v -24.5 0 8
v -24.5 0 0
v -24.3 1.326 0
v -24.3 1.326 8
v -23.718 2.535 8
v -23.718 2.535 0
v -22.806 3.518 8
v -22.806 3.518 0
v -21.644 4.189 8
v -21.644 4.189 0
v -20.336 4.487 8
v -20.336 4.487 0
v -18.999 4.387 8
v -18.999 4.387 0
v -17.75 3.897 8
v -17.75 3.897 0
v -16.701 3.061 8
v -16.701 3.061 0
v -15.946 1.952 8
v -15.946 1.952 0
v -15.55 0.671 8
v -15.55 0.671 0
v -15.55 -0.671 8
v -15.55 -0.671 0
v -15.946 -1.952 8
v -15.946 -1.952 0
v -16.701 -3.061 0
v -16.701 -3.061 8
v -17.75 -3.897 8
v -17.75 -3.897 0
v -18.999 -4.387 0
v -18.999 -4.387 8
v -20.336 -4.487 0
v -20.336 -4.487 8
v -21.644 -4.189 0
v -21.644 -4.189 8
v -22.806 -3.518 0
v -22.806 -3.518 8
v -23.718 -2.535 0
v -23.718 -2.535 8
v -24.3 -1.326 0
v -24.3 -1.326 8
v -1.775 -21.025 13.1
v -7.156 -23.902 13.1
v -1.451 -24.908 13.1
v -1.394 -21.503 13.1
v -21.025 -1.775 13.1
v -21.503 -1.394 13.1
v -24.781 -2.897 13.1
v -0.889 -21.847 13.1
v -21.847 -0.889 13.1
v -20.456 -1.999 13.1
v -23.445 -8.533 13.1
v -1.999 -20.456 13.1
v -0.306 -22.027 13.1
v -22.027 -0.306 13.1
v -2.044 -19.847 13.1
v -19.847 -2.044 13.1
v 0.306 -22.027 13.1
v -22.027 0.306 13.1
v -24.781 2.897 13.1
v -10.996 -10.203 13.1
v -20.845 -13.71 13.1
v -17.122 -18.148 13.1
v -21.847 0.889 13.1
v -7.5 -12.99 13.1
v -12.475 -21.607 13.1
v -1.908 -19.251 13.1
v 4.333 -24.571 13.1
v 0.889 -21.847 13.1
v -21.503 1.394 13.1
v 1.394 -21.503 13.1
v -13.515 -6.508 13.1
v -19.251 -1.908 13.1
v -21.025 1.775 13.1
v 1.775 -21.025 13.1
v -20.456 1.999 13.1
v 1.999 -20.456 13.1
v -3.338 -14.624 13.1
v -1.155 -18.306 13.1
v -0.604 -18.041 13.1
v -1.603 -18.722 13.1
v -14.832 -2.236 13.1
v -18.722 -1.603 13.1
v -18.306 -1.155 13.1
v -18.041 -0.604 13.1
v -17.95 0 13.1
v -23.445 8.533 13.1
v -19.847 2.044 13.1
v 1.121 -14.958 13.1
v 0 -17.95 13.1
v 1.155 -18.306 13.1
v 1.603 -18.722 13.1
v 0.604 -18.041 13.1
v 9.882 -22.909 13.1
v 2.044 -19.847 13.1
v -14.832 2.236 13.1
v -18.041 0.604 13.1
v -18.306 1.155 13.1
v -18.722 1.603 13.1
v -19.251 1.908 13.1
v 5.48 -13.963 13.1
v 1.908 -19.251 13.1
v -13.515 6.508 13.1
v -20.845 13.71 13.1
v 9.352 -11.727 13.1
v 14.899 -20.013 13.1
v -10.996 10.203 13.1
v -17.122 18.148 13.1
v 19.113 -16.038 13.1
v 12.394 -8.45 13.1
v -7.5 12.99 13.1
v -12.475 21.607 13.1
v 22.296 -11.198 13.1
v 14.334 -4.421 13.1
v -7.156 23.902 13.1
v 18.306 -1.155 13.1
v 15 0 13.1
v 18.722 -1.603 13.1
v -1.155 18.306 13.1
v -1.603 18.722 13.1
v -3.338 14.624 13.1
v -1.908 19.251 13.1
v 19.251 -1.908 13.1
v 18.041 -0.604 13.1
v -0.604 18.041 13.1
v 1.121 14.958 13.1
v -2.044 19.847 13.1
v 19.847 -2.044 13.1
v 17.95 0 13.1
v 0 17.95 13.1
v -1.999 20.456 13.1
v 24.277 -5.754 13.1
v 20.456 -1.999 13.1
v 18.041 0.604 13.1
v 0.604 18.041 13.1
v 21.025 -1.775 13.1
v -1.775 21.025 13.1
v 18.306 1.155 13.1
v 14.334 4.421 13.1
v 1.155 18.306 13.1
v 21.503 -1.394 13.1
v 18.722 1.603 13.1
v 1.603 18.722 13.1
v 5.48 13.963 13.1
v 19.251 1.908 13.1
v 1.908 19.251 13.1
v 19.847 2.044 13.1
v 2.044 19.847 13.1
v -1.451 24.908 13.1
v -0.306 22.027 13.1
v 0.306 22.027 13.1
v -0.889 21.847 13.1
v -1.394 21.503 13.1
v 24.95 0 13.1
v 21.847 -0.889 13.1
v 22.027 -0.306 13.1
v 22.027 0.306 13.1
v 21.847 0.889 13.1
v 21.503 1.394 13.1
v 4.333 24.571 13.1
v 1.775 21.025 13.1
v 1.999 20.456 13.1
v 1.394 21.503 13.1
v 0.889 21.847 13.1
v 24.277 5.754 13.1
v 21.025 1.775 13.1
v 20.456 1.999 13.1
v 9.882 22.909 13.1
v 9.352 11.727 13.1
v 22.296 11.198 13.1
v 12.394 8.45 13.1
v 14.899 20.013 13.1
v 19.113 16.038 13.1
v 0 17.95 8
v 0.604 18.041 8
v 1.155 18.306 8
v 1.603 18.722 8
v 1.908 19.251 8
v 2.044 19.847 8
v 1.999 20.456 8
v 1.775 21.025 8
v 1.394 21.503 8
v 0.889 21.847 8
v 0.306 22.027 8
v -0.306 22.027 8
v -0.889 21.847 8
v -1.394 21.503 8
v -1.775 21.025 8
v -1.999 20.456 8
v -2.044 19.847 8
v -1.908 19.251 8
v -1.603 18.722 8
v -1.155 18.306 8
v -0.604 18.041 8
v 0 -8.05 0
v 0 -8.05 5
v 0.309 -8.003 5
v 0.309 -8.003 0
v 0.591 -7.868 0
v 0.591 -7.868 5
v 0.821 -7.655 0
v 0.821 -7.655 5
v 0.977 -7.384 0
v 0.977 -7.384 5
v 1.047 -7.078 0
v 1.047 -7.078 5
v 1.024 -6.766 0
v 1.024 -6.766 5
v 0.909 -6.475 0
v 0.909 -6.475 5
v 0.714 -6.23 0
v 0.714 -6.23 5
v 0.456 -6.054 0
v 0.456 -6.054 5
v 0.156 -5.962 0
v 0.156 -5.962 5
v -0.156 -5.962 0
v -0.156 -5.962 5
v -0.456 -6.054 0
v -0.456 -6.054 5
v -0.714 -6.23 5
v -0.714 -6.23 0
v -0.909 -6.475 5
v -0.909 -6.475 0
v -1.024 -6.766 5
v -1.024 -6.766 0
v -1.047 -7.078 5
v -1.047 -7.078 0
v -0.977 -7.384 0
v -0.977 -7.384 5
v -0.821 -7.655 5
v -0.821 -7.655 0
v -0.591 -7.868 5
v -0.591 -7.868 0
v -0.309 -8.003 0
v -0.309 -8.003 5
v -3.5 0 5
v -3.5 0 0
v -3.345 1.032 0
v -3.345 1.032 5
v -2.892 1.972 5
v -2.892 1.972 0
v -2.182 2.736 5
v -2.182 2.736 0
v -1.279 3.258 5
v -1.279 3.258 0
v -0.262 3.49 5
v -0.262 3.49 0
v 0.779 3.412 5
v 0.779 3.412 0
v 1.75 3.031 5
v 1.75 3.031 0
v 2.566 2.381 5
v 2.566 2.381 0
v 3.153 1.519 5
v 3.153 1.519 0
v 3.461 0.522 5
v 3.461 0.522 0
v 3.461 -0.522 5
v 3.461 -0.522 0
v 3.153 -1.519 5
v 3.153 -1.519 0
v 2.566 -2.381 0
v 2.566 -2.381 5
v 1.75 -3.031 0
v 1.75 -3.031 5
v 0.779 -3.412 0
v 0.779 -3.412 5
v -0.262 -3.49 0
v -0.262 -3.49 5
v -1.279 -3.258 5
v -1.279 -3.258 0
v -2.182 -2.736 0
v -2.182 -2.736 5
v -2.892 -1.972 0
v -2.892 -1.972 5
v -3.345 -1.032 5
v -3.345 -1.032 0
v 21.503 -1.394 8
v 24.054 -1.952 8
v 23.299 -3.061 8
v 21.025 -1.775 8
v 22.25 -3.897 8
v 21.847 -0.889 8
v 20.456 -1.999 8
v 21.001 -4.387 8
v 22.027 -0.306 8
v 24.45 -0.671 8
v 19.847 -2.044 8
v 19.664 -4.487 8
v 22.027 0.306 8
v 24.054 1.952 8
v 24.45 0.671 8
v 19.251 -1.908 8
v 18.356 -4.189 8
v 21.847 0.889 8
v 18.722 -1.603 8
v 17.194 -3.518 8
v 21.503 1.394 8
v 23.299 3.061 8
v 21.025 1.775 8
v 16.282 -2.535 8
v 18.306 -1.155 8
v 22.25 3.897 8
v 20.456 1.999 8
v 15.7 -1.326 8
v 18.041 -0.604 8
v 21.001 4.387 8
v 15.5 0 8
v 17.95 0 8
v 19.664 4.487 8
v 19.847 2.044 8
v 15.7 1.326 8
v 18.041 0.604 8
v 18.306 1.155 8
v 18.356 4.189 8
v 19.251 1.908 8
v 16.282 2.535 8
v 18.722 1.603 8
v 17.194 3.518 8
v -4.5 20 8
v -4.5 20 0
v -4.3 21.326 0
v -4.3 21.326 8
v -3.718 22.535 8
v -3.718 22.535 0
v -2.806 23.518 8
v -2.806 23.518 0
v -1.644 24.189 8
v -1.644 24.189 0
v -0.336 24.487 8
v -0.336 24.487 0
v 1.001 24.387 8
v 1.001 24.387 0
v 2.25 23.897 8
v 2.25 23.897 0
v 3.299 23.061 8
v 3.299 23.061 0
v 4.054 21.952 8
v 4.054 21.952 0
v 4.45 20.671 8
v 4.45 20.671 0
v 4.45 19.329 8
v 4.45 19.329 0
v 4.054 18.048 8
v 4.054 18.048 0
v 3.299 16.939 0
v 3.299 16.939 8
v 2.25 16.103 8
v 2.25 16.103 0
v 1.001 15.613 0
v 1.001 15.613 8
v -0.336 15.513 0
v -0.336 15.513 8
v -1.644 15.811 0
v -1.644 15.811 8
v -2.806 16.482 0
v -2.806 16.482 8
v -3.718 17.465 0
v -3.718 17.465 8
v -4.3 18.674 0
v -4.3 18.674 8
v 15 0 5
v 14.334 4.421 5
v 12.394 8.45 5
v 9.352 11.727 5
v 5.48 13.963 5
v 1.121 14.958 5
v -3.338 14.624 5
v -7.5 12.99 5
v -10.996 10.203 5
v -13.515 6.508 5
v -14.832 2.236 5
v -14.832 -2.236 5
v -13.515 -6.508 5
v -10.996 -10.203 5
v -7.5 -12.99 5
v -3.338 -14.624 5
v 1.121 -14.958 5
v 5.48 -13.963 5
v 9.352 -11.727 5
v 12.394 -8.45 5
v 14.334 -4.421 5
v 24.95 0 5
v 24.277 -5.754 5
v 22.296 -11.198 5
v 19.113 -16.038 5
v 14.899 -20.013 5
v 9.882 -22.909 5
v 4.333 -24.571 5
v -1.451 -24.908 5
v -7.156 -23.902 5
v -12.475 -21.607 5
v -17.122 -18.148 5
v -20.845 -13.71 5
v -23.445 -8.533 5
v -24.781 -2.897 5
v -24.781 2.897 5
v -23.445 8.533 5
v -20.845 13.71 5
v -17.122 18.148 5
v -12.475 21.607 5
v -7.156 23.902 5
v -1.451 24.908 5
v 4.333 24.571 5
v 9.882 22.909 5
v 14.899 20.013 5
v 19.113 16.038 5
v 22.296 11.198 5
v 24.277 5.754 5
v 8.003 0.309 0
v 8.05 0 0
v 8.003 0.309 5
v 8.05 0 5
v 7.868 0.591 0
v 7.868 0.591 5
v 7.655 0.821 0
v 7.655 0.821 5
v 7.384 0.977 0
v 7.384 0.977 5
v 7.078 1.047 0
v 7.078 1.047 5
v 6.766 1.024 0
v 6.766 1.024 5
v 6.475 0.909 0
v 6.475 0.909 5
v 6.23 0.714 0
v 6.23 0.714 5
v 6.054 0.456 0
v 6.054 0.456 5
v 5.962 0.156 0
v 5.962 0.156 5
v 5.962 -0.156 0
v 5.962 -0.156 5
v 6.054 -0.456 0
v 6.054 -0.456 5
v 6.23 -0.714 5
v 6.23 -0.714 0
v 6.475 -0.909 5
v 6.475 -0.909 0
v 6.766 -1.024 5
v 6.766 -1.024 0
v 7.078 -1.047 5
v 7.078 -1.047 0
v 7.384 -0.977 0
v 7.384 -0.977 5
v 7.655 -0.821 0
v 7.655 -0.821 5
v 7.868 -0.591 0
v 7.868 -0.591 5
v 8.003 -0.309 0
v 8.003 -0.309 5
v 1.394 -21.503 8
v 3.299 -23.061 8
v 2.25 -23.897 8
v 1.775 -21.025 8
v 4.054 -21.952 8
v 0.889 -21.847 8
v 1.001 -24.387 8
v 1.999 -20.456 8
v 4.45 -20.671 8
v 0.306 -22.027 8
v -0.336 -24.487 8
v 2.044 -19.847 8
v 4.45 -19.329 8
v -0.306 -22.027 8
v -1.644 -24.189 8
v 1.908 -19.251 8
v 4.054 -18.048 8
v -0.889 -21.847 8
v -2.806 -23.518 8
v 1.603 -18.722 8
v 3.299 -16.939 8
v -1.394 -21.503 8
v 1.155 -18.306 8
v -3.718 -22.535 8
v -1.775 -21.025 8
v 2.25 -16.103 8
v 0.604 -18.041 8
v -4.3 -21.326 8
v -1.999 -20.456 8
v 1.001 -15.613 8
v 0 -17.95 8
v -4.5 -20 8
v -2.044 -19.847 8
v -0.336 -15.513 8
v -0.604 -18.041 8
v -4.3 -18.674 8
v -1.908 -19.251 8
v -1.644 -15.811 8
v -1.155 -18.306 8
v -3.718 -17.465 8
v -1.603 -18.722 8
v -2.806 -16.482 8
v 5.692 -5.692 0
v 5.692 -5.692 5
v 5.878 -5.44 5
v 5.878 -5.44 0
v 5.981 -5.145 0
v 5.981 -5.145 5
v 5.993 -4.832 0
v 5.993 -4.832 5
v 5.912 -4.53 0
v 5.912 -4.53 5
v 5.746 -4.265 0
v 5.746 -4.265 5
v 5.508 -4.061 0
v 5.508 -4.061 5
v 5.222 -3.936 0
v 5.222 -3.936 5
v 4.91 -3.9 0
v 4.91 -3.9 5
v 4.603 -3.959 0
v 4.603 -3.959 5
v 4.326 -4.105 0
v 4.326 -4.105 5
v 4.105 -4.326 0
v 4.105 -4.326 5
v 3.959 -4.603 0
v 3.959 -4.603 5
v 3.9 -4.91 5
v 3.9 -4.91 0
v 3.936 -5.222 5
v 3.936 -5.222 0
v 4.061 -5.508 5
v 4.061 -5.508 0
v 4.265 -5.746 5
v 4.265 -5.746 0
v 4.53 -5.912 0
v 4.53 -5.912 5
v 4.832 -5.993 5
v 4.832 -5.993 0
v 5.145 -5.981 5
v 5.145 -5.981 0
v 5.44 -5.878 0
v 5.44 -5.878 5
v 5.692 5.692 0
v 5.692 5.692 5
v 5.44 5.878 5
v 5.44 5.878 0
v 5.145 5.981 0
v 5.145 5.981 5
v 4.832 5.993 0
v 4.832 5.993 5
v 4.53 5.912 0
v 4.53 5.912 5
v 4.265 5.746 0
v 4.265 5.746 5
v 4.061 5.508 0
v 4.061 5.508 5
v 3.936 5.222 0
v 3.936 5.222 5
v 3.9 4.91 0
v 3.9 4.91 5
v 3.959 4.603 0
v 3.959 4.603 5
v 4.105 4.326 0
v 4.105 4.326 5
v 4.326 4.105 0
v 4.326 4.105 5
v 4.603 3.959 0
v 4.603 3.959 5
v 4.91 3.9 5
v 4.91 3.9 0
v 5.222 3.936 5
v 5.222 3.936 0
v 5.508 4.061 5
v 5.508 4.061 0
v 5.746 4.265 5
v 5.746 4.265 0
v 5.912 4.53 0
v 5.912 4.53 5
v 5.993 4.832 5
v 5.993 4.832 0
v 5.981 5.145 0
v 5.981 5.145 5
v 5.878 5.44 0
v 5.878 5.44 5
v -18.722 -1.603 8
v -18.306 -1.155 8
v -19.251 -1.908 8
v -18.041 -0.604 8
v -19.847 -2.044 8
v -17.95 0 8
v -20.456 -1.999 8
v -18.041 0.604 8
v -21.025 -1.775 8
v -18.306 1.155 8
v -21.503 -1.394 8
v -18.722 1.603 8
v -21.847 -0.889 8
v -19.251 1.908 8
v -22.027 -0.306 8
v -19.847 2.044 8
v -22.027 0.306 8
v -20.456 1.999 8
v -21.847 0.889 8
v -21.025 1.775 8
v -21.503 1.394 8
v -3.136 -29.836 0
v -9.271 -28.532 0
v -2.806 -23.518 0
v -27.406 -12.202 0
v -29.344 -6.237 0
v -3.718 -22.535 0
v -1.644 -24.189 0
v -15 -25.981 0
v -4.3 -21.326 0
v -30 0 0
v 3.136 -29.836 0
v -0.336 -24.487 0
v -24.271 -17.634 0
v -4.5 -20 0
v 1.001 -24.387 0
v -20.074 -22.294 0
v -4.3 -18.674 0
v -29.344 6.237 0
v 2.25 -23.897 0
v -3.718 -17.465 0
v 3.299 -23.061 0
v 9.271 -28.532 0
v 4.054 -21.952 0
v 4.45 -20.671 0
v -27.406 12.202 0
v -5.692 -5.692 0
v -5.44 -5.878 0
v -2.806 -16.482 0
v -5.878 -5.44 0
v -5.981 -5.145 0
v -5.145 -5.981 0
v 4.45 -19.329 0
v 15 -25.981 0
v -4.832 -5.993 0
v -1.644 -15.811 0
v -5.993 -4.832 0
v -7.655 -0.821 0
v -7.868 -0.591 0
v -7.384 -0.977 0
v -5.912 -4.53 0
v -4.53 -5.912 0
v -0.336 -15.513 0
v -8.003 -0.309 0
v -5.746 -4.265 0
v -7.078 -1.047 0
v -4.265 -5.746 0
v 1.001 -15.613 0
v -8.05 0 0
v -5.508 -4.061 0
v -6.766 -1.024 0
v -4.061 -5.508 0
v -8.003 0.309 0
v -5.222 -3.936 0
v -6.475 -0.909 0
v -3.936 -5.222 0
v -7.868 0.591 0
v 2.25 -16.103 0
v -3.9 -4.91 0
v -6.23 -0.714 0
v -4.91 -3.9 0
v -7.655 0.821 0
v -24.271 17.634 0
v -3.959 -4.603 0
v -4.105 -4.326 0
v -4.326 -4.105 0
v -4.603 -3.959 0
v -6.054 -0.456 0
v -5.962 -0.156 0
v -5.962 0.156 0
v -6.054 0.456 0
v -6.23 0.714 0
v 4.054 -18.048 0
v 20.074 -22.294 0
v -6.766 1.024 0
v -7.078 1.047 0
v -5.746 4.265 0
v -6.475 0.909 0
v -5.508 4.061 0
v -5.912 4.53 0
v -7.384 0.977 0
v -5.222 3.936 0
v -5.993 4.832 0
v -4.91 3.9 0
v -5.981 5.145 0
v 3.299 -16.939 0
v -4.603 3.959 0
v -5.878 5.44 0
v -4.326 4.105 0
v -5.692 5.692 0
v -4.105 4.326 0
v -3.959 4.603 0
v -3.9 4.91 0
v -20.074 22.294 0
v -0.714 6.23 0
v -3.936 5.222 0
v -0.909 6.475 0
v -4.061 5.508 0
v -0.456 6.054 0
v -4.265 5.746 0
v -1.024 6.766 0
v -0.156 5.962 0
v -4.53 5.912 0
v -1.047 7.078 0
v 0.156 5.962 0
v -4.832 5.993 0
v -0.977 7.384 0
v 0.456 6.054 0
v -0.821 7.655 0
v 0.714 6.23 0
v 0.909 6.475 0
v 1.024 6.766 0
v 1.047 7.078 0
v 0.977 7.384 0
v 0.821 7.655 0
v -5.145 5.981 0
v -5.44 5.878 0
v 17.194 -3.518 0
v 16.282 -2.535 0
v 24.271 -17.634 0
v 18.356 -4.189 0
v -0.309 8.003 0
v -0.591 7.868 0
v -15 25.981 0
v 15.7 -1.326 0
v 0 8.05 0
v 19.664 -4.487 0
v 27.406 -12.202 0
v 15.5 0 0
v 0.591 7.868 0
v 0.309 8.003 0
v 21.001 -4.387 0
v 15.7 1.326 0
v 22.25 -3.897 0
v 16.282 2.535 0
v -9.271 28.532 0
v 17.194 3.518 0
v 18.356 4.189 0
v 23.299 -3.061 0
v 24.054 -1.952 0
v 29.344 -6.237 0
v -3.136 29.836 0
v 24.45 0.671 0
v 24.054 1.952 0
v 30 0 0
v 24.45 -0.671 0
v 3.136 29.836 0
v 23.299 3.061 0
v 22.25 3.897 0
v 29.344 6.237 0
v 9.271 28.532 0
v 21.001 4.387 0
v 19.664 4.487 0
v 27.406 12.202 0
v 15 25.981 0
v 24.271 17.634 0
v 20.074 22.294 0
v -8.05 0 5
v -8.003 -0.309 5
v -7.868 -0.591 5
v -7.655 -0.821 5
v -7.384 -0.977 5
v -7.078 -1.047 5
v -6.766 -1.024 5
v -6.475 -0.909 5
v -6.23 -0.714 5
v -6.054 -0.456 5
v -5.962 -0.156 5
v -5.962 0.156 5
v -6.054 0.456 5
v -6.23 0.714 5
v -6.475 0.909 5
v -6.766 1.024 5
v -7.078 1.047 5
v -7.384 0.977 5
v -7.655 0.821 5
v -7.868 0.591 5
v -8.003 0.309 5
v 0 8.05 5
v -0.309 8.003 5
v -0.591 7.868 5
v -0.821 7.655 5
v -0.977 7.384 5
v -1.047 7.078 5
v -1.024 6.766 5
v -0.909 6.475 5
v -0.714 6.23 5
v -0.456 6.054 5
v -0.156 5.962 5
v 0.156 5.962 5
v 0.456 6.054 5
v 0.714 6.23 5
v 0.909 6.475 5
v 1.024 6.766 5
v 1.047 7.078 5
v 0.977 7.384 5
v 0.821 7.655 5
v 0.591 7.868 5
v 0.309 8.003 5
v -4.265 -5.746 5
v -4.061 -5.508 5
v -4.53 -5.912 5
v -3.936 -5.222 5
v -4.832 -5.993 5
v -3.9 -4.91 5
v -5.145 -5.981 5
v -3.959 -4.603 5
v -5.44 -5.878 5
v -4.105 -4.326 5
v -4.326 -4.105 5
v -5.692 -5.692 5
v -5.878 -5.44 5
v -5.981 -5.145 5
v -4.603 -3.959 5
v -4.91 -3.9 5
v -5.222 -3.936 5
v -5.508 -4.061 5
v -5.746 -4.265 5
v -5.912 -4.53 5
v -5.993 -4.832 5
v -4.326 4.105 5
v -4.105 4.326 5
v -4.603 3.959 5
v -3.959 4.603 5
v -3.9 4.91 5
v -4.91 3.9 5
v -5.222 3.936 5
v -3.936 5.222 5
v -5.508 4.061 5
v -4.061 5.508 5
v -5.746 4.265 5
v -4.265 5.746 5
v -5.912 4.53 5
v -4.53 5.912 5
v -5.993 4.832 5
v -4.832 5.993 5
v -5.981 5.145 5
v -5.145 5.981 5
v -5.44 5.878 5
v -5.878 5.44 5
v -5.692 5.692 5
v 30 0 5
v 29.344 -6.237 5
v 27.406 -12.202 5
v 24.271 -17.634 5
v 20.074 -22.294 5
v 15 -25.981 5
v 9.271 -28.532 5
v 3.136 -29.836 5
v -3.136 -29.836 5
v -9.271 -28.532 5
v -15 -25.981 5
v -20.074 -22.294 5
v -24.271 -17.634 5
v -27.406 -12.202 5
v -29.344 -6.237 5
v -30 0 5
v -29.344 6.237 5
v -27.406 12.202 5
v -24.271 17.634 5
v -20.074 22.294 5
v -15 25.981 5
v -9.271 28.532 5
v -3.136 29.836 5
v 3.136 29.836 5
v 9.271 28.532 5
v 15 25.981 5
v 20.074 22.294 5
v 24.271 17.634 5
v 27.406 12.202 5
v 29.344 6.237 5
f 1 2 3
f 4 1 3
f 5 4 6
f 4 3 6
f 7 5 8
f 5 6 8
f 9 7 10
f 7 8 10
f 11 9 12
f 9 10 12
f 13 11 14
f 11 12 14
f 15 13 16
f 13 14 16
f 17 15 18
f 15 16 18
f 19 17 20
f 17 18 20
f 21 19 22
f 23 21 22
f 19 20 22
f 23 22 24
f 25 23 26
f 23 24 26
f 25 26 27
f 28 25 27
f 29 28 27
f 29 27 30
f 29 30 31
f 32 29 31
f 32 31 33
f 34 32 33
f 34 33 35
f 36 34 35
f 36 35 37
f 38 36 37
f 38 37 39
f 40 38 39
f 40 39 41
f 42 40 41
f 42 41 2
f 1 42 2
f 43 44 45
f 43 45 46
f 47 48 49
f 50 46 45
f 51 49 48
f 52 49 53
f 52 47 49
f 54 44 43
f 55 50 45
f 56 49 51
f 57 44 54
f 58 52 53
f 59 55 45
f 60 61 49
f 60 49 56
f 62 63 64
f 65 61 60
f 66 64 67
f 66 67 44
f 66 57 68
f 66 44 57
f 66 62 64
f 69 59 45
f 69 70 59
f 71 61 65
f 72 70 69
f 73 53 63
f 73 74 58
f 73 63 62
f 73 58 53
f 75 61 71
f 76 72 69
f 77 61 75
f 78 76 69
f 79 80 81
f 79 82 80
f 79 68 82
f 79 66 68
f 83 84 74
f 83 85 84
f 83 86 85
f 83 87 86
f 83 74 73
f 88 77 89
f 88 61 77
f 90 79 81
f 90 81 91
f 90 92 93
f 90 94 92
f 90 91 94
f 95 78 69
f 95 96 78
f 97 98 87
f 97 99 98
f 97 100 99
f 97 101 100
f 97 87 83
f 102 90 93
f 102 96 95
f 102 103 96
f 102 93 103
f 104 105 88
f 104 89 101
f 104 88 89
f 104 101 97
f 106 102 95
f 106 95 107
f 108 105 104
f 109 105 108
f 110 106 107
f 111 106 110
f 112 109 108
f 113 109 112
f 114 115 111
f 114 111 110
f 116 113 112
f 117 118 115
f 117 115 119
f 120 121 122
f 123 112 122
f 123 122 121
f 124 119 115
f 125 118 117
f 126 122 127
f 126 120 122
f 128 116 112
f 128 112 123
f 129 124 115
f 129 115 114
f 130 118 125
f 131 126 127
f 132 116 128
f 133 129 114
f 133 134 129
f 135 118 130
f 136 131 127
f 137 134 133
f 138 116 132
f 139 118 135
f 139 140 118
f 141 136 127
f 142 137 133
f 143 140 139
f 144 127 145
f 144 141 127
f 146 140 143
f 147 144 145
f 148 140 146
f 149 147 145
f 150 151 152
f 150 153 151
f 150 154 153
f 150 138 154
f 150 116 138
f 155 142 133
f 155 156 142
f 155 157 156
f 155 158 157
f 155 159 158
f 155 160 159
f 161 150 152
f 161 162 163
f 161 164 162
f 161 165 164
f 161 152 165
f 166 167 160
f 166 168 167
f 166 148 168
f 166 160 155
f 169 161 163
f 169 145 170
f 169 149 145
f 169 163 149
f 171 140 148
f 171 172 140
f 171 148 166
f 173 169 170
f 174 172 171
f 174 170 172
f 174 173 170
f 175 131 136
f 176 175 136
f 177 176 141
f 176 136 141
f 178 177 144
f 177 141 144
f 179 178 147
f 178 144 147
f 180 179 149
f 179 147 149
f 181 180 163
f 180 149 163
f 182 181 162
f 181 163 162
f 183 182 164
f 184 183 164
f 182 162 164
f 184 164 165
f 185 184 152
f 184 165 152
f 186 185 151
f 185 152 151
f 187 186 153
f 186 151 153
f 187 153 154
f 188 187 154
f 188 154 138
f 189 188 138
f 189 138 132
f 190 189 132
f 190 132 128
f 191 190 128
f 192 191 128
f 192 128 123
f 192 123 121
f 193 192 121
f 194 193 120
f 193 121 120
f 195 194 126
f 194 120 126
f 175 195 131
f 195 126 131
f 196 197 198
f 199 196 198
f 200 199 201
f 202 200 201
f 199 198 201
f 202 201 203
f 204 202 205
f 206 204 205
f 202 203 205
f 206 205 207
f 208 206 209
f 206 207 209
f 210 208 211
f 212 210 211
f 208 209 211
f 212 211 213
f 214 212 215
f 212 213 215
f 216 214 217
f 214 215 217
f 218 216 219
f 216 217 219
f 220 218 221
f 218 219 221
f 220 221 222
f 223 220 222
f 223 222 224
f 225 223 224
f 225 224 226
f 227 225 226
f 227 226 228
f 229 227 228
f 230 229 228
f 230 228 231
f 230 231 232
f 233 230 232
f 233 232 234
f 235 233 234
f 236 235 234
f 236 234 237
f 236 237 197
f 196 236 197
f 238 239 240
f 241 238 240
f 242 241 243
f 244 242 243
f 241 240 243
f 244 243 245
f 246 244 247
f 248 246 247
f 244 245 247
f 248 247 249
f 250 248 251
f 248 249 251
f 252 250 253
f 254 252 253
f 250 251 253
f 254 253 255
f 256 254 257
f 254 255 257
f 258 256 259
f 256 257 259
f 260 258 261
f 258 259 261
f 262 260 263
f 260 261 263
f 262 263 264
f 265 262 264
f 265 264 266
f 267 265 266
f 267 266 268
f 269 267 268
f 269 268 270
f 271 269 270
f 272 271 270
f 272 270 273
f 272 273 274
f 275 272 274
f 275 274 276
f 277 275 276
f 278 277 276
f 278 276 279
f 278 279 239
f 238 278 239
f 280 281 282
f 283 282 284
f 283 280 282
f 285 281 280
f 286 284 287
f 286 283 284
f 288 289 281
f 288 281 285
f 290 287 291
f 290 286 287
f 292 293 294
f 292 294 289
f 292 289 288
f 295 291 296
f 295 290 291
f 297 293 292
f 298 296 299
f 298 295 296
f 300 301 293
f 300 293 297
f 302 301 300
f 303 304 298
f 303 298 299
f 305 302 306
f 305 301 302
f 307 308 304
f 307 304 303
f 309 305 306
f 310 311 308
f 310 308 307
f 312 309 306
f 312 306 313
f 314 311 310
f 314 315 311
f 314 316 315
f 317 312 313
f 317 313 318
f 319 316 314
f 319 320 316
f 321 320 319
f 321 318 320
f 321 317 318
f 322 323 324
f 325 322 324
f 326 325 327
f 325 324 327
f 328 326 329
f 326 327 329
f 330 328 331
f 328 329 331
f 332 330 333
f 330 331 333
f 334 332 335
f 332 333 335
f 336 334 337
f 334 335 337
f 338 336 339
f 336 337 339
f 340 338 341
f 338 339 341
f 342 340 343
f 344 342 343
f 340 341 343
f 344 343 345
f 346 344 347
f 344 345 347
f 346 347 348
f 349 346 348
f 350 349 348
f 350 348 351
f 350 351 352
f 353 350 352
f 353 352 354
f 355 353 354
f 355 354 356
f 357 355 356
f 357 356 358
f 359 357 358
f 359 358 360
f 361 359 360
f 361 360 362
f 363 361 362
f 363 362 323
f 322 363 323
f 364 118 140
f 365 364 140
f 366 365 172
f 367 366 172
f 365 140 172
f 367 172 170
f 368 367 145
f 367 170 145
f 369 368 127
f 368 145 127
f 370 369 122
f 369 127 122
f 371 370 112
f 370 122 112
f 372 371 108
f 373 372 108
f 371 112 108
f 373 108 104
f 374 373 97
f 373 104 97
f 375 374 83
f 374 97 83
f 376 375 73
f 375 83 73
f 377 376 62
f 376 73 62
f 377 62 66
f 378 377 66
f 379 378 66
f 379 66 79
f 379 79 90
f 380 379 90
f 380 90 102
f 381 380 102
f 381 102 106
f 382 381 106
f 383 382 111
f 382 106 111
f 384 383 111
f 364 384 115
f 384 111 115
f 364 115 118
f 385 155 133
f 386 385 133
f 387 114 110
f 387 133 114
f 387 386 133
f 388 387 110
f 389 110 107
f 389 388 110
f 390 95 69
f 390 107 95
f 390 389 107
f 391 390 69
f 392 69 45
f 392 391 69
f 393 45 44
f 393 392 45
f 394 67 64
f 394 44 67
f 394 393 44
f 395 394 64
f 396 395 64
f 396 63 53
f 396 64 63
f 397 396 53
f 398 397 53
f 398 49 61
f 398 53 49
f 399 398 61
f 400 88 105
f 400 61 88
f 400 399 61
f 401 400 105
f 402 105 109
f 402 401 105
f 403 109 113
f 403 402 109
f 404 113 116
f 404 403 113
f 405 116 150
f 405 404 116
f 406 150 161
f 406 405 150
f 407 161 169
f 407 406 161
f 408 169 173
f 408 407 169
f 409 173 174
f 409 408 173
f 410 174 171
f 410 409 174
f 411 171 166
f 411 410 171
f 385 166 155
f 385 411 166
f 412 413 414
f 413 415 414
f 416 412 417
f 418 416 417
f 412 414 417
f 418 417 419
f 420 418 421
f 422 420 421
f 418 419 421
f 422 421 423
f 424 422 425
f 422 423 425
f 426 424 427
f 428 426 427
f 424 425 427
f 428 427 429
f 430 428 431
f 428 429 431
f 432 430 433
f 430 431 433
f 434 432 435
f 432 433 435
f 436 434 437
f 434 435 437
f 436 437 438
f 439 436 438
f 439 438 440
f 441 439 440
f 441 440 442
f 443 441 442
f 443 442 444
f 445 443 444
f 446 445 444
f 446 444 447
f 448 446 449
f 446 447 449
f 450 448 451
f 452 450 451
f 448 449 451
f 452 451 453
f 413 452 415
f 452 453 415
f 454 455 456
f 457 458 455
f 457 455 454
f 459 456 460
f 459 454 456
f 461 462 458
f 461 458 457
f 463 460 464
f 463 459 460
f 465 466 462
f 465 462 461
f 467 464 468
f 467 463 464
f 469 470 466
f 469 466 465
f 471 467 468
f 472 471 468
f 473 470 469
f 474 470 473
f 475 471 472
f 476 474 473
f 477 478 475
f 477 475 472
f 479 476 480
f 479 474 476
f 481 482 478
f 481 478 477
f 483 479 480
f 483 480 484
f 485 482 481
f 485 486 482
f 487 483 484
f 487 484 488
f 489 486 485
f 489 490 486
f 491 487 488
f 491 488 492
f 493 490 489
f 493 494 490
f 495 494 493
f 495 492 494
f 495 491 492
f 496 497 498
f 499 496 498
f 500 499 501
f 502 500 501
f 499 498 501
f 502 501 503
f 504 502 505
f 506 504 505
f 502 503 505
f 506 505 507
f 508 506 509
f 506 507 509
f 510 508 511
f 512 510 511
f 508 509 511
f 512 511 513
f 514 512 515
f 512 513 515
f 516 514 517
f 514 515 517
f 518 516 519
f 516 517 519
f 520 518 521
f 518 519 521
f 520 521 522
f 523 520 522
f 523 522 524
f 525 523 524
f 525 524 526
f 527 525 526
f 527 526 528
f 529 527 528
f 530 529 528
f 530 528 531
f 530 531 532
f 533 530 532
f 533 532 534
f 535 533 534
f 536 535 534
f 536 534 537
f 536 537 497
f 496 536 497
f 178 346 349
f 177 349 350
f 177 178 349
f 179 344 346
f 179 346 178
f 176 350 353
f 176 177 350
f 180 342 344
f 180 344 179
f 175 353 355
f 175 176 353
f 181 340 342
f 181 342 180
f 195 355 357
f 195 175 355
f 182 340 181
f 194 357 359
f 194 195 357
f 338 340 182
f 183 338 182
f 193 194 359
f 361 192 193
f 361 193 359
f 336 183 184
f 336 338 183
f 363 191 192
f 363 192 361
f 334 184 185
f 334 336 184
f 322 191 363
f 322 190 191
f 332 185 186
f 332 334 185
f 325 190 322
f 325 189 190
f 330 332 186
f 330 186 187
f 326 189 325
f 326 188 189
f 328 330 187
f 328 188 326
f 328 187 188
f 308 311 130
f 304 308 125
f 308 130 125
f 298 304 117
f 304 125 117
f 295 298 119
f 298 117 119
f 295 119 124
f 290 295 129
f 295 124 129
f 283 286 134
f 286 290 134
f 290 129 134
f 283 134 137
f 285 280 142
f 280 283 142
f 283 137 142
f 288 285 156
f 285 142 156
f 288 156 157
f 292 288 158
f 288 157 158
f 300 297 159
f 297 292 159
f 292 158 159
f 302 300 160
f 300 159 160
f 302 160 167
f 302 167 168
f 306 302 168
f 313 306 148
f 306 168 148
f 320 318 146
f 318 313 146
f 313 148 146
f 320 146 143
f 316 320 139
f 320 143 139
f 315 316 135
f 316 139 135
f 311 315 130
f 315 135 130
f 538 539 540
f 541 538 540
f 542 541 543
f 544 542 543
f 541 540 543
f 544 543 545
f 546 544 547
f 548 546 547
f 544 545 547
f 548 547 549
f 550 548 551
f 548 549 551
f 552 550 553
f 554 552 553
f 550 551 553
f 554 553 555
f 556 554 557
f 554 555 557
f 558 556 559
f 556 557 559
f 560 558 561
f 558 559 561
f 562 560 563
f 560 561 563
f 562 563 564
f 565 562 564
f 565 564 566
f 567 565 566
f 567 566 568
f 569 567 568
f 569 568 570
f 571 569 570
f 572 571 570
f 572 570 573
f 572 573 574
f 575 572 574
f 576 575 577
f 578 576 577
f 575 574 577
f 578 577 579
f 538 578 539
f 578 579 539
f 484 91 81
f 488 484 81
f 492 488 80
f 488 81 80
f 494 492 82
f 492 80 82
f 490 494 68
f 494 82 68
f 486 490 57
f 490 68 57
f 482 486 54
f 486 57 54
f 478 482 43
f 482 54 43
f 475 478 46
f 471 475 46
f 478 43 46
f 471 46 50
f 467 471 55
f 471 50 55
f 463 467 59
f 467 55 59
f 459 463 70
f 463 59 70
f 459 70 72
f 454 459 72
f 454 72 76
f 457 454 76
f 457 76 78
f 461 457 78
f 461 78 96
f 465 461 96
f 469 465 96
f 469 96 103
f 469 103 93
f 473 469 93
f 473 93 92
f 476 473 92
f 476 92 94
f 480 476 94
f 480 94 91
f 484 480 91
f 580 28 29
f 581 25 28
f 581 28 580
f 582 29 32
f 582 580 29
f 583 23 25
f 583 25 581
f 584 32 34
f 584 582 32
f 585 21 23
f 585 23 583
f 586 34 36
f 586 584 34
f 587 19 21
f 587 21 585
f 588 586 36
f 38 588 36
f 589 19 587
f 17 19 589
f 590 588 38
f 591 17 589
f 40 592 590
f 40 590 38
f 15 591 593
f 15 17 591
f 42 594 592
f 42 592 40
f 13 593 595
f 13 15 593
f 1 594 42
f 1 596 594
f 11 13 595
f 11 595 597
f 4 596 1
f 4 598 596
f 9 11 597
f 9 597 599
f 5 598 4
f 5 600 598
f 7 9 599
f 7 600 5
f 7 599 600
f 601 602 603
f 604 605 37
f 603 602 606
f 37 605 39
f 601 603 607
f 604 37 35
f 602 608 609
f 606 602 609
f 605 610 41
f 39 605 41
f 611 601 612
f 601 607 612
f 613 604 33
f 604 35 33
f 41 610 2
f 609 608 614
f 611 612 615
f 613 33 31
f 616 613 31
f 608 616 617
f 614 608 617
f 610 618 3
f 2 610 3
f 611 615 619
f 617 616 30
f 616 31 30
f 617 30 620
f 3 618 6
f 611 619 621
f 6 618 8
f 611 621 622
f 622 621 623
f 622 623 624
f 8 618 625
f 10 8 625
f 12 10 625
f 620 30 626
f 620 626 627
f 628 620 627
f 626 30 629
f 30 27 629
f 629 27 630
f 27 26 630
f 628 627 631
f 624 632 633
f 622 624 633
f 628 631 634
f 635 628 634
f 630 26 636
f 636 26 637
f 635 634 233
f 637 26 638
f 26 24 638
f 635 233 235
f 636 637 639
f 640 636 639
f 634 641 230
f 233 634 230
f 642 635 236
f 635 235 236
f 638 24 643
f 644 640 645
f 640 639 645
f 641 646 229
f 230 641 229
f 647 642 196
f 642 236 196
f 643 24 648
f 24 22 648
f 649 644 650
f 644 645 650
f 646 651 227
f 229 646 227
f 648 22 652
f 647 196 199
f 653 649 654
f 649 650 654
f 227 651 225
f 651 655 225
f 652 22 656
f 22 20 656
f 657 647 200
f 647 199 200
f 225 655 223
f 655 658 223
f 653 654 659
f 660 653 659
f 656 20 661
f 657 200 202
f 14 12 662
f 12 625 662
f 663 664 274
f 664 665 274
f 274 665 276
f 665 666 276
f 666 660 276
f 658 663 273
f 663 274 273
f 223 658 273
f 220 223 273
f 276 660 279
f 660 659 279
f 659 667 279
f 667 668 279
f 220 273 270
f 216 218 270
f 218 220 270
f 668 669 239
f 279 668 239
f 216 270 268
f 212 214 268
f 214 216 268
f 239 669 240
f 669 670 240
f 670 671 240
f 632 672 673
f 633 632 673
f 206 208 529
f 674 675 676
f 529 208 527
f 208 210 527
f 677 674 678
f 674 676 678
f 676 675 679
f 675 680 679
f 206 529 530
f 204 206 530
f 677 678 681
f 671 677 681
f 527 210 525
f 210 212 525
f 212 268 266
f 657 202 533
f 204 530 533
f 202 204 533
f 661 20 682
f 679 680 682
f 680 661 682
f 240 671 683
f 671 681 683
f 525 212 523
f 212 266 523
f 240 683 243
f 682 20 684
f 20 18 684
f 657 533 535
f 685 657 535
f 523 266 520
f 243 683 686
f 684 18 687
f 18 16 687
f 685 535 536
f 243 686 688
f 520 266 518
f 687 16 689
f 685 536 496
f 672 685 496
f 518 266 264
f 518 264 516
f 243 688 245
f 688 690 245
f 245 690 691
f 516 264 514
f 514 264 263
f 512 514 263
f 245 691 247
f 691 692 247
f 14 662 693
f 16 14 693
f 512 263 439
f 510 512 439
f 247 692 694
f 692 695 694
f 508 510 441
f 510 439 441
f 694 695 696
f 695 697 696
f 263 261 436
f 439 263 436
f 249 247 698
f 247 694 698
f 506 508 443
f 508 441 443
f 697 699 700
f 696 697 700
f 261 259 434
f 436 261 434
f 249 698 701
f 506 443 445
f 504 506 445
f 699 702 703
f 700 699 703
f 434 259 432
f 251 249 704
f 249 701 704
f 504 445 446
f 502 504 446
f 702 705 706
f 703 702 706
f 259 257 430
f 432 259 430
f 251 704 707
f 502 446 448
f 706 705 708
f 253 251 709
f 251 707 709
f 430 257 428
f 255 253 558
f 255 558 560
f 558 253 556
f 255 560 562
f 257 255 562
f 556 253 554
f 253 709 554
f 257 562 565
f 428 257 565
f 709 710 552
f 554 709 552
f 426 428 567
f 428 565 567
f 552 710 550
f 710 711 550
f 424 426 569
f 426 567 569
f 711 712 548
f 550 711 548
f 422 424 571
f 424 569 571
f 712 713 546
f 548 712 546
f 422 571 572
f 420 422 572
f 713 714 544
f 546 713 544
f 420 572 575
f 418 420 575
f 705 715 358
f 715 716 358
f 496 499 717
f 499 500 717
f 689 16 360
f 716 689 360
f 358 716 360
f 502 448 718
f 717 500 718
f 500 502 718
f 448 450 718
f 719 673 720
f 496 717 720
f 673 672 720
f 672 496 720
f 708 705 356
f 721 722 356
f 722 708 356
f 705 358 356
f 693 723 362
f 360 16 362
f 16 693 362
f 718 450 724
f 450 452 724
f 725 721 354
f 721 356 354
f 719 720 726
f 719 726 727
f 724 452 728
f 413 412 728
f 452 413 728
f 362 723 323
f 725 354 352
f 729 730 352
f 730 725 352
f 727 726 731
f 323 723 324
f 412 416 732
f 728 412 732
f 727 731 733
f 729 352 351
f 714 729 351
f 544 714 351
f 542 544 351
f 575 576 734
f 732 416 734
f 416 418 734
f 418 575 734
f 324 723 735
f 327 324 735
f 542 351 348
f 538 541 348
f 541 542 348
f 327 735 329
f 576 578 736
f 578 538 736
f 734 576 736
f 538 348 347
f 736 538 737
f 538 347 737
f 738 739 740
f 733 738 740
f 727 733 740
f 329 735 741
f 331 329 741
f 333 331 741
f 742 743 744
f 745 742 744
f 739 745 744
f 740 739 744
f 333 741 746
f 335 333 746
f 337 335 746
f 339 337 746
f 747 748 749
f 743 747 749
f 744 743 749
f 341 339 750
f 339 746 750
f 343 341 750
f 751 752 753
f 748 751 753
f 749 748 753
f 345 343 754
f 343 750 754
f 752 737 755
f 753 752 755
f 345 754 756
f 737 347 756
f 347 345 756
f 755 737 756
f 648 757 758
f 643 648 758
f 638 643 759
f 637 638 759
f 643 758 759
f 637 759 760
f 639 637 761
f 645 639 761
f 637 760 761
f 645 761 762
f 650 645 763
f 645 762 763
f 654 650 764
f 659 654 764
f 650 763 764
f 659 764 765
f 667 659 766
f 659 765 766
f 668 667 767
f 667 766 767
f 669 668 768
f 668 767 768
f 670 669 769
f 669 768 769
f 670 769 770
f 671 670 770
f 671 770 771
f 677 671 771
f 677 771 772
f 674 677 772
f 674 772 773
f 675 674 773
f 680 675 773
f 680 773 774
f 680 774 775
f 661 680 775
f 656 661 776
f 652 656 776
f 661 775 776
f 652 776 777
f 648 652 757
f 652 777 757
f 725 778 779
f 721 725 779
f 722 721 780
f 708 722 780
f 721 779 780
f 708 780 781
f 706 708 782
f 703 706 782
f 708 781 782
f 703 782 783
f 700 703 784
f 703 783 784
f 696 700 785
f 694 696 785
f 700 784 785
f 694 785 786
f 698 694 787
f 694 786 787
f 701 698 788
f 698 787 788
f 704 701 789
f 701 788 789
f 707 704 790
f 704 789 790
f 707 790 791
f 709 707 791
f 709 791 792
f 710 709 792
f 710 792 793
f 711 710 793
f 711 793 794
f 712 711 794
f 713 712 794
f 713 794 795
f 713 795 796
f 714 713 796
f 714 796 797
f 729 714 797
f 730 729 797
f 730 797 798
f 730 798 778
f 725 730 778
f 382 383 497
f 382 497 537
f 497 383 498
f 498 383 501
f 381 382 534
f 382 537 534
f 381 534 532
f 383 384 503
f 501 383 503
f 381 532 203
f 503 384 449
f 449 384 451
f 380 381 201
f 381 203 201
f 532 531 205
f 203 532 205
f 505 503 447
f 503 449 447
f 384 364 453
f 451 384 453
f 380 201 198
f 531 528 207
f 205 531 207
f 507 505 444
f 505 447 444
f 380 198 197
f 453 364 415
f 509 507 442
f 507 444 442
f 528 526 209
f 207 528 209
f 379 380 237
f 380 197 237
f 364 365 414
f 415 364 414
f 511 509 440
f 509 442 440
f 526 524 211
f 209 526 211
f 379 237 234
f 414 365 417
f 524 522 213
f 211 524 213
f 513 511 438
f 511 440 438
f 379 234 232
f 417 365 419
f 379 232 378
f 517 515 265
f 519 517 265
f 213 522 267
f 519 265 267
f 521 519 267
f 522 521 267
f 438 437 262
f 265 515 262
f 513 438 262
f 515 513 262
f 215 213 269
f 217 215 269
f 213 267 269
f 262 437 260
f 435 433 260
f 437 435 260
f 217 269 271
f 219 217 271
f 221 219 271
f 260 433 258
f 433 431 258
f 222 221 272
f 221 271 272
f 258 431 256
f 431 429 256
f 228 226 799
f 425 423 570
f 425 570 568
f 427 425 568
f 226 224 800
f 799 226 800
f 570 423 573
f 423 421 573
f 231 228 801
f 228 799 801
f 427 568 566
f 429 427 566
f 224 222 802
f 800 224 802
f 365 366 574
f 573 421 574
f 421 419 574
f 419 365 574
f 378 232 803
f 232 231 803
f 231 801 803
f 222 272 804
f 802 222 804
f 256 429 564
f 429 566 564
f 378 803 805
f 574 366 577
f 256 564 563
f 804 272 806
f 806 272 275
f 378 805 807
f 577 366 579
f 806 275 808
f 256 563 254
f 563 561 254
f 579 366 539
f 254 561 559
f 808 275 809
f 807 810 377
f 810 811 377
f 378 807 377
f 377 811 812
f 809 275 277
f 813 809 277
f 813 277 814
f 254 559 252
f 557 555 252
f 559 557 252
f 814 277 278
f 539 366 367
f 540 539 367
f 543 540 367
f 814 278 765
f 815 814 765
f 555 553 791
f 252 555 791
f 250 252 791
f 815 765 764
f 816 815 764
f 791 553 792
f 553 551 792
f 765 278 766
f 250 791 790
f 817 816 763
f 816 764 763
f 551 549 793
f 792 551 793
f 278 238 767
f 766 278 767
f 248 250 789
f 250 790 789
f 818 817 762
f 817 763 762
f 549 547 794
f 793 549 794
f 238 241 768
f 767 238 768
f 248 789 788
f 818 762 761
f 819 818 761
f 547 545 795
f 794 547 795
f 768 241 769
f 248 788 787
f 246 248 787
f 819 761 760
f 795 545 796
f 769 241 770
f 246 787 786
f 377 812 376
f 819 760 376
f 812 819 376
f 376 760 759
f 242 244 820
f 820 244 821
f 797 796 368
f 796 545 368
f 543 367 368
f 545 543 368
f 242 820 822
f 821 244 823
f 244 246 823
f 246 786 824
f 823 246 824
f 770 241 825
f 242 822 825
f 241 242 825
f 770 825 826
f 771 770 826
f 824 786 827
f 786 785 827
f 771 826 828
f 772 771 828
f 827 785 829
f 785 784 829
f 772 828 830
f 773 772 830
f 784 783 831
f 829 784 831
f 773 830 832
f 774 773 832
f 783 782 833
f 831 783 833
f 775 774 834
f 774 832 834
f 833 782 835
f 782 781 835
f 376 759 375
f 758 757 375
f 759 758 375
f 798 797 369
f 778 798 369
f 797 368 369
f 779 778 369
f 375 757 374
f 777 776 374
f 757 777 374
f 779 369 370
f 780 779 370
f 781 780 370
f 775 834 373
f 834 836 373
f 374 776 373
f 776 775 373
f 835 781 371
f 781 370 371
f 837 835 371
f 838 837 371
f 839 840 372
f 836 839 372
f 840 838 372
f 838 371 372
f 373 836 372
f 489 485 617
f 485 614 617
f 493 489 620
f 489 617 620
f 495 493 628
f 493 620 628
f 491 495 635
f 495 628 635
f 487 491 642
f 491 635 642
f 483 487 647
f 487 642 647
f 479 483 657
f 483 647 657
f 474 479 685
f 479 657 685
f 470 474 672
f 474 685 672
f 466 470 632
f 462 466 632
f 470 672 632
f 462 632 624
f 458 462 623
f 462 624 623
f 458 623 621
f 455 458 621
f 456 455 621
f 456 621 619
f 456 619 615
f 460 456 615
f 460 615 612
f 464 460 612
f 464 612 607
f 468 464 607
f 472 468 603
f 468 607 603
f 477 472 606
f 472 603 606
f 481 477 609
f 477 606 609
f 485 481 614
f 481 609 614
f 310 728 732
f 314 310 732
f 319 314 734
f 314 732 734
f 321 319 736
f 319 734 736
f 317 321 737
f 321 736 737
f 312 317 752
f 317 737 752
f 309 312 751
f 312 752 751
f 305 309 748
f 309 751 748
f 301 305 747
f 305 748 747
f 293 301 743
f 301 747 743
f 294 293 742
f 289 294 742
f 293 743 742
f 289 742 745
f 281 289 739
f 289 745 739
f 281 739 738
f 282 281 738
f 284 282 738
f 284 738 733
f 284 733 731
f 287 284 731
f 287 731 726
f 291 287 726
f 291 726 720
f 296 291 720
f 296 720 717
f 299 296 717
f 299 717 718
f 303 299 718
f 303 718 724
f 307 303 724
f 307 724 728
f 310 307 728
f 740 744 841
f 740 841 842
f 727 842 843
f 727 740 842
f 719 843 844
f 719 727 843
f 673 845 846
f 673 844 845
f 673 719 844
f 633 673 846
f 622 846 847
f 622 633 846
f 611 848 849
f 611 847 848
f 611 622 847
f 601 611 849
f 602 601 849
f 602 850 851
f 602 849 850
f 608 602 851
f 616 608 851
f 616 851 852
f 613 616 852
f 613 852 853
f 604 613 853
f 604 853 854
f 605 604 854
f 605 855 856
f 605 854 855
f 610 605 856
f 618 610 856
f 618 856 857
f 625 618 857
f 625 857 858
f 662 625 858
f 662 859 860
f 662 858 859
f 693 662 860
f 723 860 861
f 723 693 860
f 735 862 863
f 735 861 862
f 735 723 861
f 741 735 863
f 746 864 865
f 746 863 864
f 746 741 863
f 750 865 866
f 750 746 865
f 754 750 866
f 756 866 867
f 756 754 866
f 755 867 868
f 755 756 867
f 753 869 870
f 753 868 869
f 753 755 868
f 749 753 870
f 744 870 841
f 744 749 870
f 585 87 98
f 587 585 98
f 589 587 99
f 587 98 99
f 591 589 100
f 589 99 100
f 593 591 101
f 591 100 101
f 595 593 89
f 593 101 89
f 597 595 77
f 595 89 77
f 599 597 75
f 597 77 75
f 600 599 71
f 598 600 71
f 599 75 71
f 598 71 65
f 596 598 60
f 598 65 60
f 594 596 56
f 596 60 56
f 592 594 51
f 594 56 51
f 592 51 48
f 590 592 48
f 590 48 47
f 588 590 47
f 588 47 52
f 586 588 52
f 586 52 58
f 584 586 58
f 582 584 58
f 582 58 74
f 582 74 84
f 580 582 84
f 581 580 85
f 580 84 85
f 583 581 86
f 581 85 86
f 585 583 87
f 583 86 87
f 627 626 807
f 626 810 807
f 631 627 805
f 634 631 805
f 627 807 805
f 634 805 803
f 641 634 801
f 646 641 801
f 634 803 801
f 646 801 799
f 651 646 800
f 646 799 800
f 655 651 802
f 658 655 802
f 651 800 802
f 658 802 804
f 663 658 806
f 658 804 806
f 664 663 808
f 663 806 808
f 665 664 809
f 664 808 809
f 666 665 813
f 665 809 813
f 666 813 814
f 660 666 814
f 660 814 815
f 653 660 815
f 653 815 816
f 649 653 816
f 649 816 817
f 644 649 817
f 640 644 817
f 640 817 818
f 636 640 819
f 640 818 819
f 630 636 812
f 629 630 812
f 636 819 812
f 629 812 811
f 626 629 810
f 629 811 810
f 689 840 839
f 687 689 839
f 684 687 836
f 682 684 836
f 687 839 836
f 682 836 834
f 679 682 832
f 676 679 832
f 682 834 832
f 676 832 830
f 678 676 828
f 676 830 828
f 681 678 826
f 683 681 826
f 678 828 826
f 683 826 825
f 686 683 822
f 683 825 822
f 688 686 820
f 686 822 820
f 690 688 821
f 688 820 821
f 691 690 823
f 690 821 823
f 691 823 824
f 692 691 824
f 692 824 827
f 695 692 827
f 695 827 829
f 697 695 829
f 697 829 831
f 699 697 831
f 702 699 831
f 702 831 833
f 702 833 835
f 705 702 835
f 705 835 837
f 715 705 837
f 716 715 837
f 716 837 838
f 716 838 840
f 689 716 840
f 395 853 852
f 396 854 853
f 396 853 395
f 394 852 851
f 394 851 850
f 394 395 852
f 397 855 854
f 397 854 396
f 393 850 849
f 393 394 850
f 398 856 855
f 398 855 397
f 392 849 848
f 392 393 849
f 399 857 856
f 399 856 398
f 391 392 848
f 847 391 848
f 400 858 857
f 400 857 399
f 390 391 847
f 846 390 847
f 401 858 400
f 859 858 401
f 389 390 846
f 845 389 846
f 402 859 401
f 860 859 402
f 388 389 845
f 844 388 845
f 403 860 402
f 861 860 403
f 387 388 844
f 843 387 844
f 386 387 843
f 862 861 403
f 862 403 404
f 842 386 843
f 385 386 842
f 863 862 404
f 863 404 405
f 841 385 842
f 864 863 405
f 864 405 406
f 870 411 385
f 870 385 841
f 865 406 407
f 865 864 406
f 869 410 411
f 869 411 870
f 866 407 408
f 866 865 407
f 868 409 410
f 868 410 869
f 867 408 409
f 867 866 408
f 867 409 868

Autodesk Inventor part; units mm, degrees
ref_plane "YZ Plane" through (0, 0, 0) normal (1, 0, 0) x (0, 1, 0)
ref_plane "XZ Plane" through (0, 0, 0) normal (0, 1, 0) x (-1, 0, 0)
ref_plane "XY Plane" through (0, 0, 0) normal (0, 0, 1) x (1, 0, 0)
sketch "Sketch1" plane through (0, 0, 0) normal (0, 0, 1) x (1, 0, 0)
  circle A0 centre (0, 0) radius 30
  dimension "d0" = 60
extrude "Extrusion1" add sketch "Sketch1" along normal blind 5
sketch "Sketch2" plane through (0, 0, 5) normal (0, 0, 1) x (1, 0, 0)
  circle A0 centre (0, 0) radius 24.95
  dimension "d3" = 49.9
extrude "Extrusion2" add sketch "Sketch2" along normal blind 8.1
sketch "Sketch3" plane through (0, 0, 13.1) normal (0, 0, 1) x (1, 0, 0)
  circle A0 centre (0, 0) radius 15
  dimension "d6" = 30
extrude "Extrusion3" cut sketch "Sketch3" against normal through all
sketch "Sketch4" plane through (0, 0, 0) normal (0, 0, -1) x (-1, 0, 0)
  circle A0 centre (0, 0) radius 20
  dimension "d9" = 40
extrude "Extrusion4" add sketch "Sketch4" against normal blind 5
sketch "Sketch5" plane through (0, 0, 0) normal (0, 0, -1) x (-1, 0, 0)
  circle A0 centre (0, 0) radius 3.5
  dimension "d12" = 7
extrude "Extrusion5" cut sketch "Sketch5" against normal through all
sketch "Sketch6" plane through (0, 0, 5) normal (0, 0, 1) x (1, 0, 0)
  circle A0 centre (7, 0) radius 1.05
  point P0 (0, 0)
  dimension "d15" = 2.1
  dimension "d16" = 7
extrude "Extrusion6" cut sketch "Sketch6" against normal through all
pattern_circular "Circular Pattern1" count 8 over 360 about axis through (0, 0, -10) along (0, 0, 1) of "Extrusion6"
sketch "Sketch7" plane through (0, 0, 13.1) normal (0, 0, 1) x (1, 0, 0)
  circle A0 centre (-20, 0) radius 2.05
  point P0 (0, 0)
  dimension "d22" = 4.1
  dimension "d23" = 20
extrude "Extrusion7" cut sketch "Sketch7" against normal through all
pattern_circular "Circular Pattern2" count 4 over 360 about axis through (0, 0, -10) along (0, 0, 1) of "Extrusion7"
sketch "Sketch8" plane through (0, 0, 0) normal (0, 0, -1) x (-1, 0, 0)
  circle A0 centre (0, -20) radius 2.05 projected
  circle A1 centre (20, 0) radius 2.05 projected
  circle A2 centre (0, 20) radius 2.05 projected
  circle A3 centre (-20, 0) radius 2.05 projected
  circle A4 centre (0, -20) radius 4.5
  circle A5 centre (20, 0) radius 4.5
  circle A6 centre (0, 20) radius 4.5
  circle A7 centre (-20, 0) radius 4.5
  point P0 (0, 0)
  dimension "d29" = 9
  dimension "d30" = 9
  dimension "d31" = 9
  dimension "d32" = 9
extrude "Extrusion8" cut sketch "Sketch8" against normal blind 8
properties part number "bearing_bracket3"
